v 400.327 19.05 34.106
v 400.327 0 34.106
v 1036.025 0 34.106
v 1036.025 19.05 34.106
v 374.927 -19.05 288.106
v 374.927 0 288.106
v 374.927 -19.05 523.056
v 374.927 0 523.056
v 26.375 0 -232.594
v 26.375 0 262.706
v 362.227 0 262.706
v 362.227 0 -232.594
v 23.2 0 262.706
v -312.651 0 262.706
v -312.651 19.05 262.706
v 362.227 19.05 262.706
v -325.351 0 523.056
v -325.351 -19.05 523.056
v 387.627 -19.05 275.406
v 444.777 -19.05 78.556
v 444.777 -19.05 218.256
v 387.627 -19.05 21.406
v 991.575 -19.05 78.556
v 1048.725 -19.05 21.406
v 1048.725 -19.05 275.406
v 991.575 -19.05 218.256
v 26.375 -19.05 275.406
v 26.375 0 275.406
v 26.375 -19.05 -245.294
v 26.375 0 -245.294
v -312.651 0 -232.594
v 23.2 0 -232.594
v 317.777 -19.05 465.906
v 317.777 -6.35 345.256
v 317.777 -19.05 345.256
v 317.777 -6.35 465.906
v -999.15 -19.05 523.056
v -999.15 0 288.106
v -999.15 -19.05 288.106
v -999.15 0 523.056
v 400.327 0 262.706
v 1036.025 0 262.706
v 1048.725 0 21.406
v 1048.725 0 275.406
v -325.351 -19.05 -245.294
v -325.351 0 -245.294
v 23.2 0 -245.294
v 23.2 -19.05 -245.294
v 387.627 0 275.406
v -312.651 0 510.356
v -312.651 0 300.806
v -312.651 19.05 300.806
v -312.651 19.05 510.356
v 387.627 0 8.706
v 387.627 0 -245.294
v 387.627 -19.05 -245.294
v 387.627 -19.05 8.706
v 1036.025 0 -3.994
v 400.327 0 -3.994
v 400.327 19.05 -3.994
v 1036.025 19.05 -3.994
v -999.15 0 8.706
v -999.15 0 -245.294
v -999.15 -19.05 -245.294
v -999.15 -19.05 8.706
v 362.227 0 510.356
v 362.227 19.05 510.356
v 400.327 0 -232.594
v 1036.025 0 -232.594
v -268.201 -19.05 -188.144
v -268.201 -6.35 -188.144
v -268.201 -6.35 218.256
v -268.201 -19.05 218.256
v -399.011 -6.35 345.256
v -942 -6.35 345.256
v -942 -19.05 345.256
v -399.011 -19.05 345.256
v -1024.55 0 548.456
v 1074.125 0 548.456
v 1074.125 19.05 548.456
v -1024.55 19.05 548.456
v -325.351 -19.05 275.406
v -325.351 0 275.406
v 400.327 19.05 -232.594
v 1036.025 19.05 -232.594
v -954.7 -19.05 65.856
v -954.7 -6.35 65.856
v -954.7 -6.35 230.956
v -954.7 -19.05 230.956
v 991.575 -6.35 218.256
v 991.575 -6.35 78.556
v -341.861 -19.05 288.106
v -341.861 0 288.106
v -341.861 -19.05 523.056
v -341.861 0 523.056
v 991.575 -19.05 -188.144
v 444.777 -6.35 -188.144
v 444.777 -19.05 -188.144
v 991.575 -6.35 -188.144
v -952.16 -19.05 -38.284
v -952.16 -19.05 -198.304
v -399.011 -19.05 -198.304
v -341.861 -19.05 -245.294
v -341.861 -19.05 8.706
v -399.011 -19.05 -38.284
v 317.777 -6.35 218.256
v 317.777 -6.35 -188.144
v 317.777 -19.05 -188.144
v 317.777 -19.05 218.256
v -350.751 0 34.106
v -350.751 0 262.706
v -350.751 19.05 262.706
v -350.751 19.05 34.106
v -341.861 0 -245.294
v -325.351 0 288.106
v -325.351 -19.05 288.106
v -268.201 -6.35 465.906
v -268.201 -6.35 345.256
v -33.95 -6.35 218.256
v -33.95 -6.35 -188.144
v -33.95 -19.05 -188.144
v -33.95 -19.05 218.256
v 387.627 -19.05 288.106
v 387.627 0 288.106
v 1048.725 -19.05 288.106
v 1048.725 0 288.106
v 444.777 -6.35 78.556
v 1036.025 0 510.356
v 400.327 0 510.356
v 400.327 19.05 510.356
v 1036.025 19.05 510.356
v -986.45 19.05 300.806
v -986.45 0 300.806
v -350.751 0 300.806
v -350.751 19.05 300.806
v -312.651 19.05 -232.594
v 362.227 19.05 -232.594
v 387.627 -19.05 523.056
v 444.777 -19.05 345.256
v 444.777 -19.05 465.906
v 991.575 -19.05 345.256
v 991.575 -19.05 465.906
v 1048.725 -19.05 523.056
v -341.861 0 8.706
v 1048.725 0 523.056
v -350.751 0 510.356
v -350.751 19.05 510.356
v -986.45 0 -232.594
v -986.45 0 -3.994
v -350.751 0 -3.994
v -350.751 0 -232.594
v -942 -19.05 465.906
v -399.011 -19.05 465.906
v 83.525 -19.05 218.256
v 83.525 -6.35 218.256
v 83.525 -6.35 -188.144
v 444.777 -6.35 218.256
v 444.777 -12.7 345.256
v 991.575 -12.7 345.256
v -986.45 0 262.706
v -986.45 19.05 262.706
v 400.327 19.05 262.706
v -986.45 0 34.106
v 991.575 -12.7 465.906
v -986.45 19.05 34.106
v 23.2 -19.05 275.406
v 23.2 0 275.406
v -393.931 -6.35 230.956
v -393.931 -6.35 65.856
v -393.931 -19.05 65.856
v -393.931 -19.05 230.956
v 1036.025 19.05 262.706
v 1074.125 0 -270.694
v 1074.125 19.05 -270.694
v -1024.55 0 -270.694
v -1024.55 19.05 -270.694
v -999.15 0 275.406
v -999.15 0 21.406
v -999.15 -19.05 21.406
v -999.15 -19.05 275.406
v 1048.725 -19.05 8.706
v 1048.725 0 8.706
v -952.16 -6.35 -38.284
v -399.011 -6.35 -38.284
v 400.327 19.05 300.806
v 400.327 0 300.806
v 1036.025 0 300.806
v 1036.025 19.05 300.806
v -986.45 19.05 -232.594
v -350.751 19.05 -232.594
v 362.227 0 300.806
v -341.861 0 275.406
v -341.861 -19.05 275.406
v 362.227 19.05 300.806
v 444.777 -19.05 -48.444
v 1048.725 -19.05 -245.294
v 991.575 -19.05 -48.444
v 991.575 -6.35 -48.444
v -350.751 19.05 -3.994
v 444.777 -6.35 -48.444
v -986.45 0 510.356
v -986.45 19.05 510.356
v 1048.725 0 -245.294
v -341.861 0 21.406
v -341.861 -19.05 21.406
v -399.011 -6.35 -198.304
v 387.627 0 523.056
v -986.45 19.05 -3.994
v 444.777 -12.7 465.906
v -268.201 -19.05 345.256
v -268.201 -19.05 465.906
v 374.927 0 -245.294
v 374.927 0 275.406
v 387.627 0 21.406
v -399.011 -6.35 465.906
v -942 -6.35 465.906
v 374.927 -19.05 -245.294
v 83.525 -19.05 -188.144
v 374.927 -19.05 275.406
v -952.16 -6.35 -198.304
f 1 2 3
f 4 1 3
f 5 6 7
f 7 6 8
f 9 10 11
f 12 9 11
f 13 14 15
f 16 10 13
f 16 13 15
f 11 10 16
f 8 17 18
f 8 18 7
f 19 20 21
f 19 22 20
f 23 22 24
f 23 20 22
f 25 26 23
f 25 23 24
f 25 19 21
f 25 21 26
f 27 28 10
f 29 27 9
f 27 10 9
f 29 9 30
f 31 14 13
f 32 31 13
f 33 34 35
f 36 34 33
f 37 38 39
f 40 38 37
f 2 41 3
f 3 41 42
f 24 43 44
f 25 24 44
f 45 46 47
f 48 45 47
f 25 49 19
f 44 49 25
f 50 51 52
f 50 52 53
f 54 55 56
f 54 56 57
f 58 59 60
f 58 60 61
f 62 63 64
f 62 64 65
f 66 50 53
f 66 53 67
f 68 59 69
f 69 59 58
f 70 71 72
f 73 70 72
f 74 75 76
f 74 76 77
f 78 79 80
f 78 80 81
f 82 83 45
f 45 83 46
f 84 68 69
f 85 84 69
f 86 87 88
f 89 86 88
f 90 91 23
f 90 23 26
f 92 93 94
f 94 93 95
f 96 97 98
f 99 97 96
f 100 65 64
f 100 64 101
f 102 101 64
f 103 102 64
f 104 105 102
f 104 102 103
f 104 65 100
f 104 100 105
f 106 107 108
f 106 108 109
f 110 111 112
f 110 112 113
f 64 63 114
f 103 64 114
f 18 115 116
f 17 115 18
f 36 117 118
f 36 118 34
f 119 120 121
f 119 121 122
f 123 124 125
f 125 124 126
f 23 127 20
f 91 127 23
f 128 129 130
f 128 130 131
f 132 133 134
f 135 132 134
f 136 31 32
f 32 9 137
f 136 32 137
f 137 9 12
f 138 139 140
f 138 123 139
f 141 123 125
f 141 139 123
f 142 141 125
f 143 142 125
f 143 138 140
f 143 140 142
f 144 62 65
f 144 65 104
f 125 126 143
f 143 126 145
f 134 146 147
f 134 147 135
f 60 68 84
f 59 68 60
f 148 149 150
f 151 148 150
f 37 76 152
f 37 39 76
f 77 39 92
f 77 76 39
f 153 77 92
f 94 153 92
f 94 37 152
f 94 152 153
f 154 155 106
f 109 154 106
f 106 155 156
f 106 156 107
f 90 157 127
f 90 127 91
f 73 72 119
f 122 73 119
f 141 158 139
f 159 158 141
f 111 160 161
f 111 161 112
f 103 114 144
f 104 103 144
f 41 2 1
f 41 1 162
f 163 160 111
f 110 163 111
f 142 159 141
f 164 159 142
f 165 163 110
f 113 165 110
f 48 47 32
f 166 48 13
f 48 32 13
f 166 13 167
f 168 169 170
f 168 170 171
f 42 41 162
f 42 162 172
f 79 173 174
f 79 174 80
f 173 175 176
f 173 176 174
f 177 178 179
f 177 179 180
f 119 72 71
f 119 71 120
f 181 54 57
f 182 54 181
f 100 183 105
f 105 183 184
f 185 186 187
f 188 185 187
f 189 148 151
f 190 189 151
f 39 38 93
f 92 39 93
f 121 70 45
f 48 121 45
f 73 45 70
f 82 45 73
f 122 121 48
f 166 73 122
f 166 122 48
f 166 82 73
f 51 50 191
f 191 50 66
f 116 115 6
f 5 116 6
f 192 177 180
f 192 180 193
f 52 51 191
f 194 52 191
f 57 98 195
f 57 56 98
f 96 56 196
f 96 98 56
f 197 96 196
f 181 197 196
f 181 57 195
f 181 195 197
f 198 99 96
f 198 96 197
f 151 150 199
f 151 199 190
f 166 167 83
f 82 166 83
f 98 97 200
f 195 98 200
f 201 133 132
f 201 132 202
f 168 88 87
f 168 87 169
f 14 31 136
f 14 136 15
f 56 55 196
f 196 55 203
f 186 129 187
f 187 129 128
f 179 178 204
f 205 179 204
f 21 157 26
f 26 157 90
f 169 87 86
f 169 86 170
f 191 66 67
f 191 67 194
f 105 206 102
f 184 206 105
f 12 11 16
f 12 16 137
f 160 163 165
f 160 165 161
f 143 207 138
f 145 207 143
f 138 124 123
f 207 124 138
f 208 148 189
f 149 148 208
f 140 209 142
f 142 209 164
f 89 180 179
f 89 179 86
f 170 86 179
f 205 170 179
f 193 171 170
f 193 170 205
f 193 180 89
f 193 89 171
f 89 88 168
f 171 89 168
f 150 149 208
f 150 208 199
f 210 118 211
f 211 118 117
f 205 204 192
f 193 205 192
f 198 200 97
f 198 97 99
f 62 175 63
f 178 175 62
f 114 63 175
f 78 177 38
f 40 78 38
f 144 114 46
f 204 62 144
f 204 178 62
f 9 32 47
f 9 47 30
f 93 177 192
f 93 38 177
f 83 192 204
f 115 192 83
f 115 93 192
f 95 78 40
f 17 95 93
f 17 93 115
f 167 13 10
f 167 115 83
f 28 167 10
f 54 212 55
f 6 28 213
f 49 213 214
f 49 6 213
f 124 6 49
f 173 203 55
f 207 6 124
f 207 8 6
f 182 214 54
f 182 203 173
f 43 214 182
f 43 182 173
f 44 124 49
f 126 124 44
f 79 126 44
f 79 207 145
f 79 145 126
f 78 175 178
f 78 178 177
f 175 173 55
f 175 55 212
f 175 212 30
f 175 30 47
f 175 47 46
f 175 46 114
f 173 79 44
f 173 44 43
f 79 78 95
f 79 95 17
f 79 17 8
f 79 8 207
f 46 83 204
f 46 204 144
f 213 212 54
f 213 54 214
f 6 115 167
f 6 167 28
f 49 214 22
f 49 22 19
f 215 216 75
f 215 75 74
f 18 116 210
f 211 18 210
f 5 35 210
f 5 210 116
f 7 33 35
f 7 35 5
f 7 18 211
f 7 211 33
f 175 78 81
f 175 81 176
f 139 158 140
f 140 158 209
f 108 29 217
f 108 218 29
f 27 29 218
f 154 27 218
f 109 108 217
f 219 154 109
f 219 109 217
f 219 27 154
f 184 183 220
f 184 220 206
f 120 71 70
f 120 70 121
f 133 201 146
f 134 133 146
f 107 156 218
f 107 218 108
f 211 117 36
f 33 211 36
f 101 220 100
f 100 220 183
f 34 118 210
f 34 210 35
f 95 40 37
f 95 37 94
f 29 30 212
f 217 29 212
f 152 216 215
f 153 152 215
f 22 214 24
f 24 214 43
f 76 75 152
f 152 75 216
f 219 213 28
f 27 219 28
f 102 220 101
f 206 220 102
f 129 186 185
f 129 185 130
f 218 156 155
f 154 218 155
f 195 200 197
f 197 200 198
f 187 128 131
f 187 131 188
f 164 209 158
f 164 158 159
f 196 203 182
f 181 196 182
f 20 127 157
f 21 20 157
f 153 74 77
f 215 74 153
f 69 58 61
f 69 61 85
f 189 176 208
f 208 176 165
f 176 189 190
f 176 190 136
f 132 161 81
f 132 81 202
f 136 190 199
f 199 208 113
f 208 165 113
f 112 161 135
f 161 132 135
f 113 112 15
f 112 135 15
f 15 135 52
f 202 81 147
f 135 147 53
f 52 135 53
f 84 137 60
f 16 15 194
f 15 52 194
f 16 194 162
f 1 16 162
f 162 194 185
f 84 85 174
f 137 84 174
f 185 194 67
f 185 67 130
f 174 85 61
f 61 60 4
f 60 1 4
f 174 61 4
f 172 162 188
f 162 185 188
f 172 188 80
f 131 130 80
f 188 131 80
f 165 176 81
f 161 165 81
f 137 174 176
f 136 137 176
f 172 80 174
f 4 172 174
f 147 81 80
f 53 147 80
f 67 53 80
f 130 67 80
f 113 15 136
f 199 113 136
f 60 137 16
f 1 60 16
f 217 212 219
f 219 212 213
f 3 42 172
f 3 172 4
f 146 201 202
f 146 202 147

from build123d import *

# Parameters (mm, degrees)
F0_W      = 635.6985
F0_H      = 38.1
F0_W_2    = 674.878
F1_DEPTH  = 19.05
F2_W      = 657.2885064902
F2_H      = 254
F2_W_2    = 553.1485062082
F2_H_2    = 160.0199994359
F3_DEPTH  = 19.05
F2_W_3    = 560.7685060475
F2_H_3    = 165.0999991145
F4_DEPTH  = 19.05
F2_H_4    = 234.95
F2_W_4    = 542.9885064902
F2_H_5    = 120.65
F5_DEPTH  = 19.05
F6_DEPTH  = 6.35
F2_W_5    = 700.278
F2_W_6    = 585.978
F7_DEPTH  = 19.05
F8_DEPTH  = 6.35
F9_DEPTH  = 6.35
F2_W_7    = 335.8515
F2_H_6    = 495.3
F2_W_8    = 234.2515
F2_H_7    = 406.4
F10_DEPTH = 19.05
F11_DEPTH = 6.35
F2_W_9    = 661.0985
F2_W_10   = 546.7985
F2_H_8    = 139.7
F12_DEPTH = 19.05
F13_DEPTH = 12.7
F14_DEPTH = 6.35
F15_DEPTH = 6.35
F16_DEPTH = 6.35


with BuildPart() as f1:
    # F0 (on Front) → F1 (new body)
    with BuildSketch(Plane.XZ):
        Polygon((-986.4497834325, 548.455909781), (-1024.5497834325, 548.455909781), (-1024.5497834325, -270.694090219), (-986.4497834325, -270.694090219), (-986.4497834325, -232.594090219), (-986.4497834325, -3.994090219), (-986.4497834325, 34.105909781), (-986.4497834325, 262.705909781), (-986.4497834325, 300.805909781), (-986.4497834325, 510.355909781), align=None)
        with Locations((-668.6005334325, -251.644090219)):
            Rectangle(F0_W, F0_H)
        with Locations((-668.6005334325, 15.055909781)):
            Rectangle(F0_W, F0_H)
        with Locations((-668.6005334325, 281.755909781)):
            Rectangle(F0_W, F0_H)
        with Locations((-668.6005334325, 529.405909781)):
            Rectangle(F0_W, F0_H)
        Polygon((-312.6512834325, 548.455909781), (-350.7512834325, 548.455909781), (-350.7512834325, 510.355909781), (-350.7512834325, 300.805909781), (-350.7512834325, 262.705909781), (-350.7512834325, 34.105909781), (-350.7512834325, -3.994090219), (-350.7512834325, -232.594090219), (-350.7512834325, -270.694090219), (-312.6512834325, -270.694090219), (-312.6512834325, -232.594090219), (-312.6512834325, 262.705909781), (-312.6512834325, 300.805909781), (-312.6512834325, 510.355909781), align=None)
        with Locations((24.7877165675, 529.405909781)):
            Rectangle(F0_W_2, F0_H)
        with Locations((24.7877165675, 281.755909781)):
            Rectangle(F0_W_2, F0_H)
        with Locations((24.7877165675, -251.644090219)):
            Rectangle(F0_W_2, F0_H)
        Polygon((400.3267165675, 548.455909781), (362.2267165675, 548.455909781), (362.2267165675, 510.355909781), (362.2267165675, 300.805909781), (362.2267165675, 262.705909781), (362.2267165675, -232.594090219), (362.2267165675, -270.694090219), (400.3267165675, -270.694090219), (400.3267165675, -232.594090219), (400.3267165675, -3.994090219), (400.3267165675, 34.105909781), (400.3267165675, 262.705909781), (400.3267165675, 300.805909781), (400.3267165675, 510.355909781), align=None)
        with Locations((718.1759665675, 15.055909781)):
            Rectangle(F0_W, F0_H)
        with Locations((718.1759665675, 281.755909781)):
            Rectangle(F0_W, F0_H)
        with Locations((718.1759665675, 529.405909781)):
            Rectangle(F0_W, F0_H)
        with Locations((718.1759665675, -251.644090219)):
            Rectangle(F0_W, F0_H)
        Polygon((1036.0252165675, -270.694090219), (1074.1252165675, -270.694090219), (1074.1252165675, 548.455909781), (1036.0252165675, 548.455909781), (1036.0252165675, 510.355909781), (1036.0252165675, 300.805909781), (1036.0252165675, 262.705909781), (1036.0252165675, 34.105909781), (1036.0252165675, -3.994090219), (1036.0252165675, -232.594090219), align=None)
    extrude(amount=-F1_DEPTH)

    # F2 (on face) → F3 (join)
    with BuildSketch(Plane.XZ):
        with Locations((-670.5055301874, -118.294090219)):
            Rectangle(F2_W, F2_H)
        with Locations((-675.5855300463, -118.294090219)):
            Rectangle(F2_W_2, F2_H_2, mode=Mode.SUBTRACT)
    extrude(amount=F3_DEPTH)

    # F2 (on face) → F4 (join)
    with BuildSketch(Plane.XZ):
        with Locations((-670.5055301874, 148.405909781)):
            Rectangle(F2_W, F2_H)
        with Locations((-674.315529966, 148.405909781)):
            Rectangle(F2_W_3, F2_H_3, mode=Mode.SUBTRACT)
    extrude(amount=F4_DEPTH)

    # F2 (on face) → F5 (join)
    with BuildSketch(Plane.XZ):
        with Locations((-670.5055301874, 405.580909781)):
            Rectangle(F2_W, F2_H_4)
        with Locations((-670.5055301874, 405.580909781)):
            Rectangle(F2_W_4, F2_H_5, mode=Mode.SUBTRACT)
    extrude(amount=F5_DEPTH)

    # F2 (on face) → F6 (join)
    with BuildSketch(Plane.XZ):
        with Locations((-670.5055301874, 405.580909781)):
            Rectangle(F2_W_4, F2_H_5)
    extrude(amount=F6_DEPTH)

    # F2 (on face) → F7 (join)
    with BuildSketch(Plane.XZ):
        with Locations((24.7877165675, 405.580909781)):
            Rectangle(F2_W_5, F2_H_4)
        with Locations((24.7877165675, 405.580909781)):
            Rectangle(F2_W_6, F2_H_5, mode=Mode.SUBTRACT)
    extrude(amount=F7_DEPTH)

    # F2 (on face) → F8 (join)
    with BuildSketch(Plane.XZ):
        with Locations((24.7877165675, 405.580909781)):
            Rectangle(F2_W_6, F2_H_5)
    extrude(amount=F8_DEPTH)

    # F2 (on face) → F9 (join)
    with BuildSketch(Plane.XZ):
        with Locations((-674.315529966, 148.405909781)):
            Rectangle(F2_W_3, F2_H_3)
        with Locations((-675.5855300463, -118.294090219)):
            Rectangle(F2_W_2, F2_H_2)
    extrude(amount=F9_DEPTH)

    # F2 (on face) → F10 (join)
    with BuildSketch(Plane.XZ):
        Polygon((23.2002165675, 275.405909781), (-325.3512834325, 275.405909781), (-325.3512834325, -245.294090219), (23.2002165675, -245.294090219), (23.2002165675, -232.594090219), (-312.6512834325, -232.594090219), (-312.6512834325, 262.705909781), (23.2002165675, 262.705909781), align=None)
        with Locations((-144.7255334325, 15.055909781)):
            Rectangle(F2_W_7, F2_H_6)
        with Locations((-151.0755334325, 15.055909781)):
            Rectangle(F2_W_8, F2_H_7, mode=Mode.SUBTRACT)
        Polygon((26.3752165675, 275.405909781), (26.3752165675, 262.705909781), (362.2267165675, 262.705909781), (362.2267165675, -232.594090219), (26.3752165675, -232.594090219), (26.3752165675, -245.294090219), (374.9267165675, -245.294090219), (374.9267165675, 275.405909781), align=None)
        with Locations((194.3009665675, 15.055909781)):
            Rectangle(F2_W_7, F2_H_6)
        with Locations((200.6509665675, 15.055909781)):
            Rectangle(F2_W_8, F2_H_7, mode=Mode.SUBTRACT)
    extrude(amount=F10_DEPTH)

    # F2 (on face) → F11 (join)
    with BuildSketch(Plane.XZ):
        with Locations((-151.0755334325, 15.055909781)):
            Rectangle(F2_W_8, F2_H_7)
        with Locations((200.6509665675, 15.055909781)):
            Rectangle(F2_W_8, F2_H_7)
    extrude(amount=F11_DEPTH)

    # F2 (on face) → F12 (join)
    with BuildSketch(Plane.XZ):
        with Locations((718.1759665675, 405.580909781)):
            Rectangle(F2_W_9, F2_H_4)
        with Locations((718.1759665675, 405.580909781)):
            Rectangle(F2_W_10, F2_H_5, mode=Mode.SUBTRACT)
        with Locations((718.1759665675, 148.405909781)):
            Rectangle(F2_W_9, F2_H)
        with Locations((718.1759665675, 148.405909781)):
            Rectangle(F2_W_10, F2_H_8, mode=Mode.SUBTRACT)
        with Locations((718.1759665675, -118.294090219)):
            Rectangle(F2_W_9, F2_H)
        with Locations((718.1759665675, -118.294090219)):
            Rectangle(F2_W_10, F2_H_8, mode=Mode.SUBTRACT)
    extrude(amount=F12_DEPTH)

    # F2 (on face) → F13 (join)
    with BuildSketch(Plane.XZ):
        with Locations((718.1759665675, 405.580909781)):
            Rectangle(F2_W_10, F2_H_5)
    extrude(amount=F13_DEPTH)

    # F14 (cut): a face of the model
    f14_faces = [f1.faces().sort_by_distance(p)[0] for p in [
        (718.1759665675, -12.7, 405.580909781),
    ]]
    extrude(f14_faces, amount=F14_DEPTH, mode=Mode.SUBTRACT)

    # F2 (on face) → F15 (cut)
    with BuildSketch(Plane.XZ):
        with Locations((718.1759665675, 405.580909781)):
            Rectangle(F2_W_10, F2_H_5)
    extrude(amount=-F15_DEPTH, mode=Mode.SUBTRACT)

    # F2 (on face) → F16 (join)
    with BuildSketch(Plane.XZ):
        with Locations((718.1759665675, 148.405909781)):
            Rectangle(F2_W_10, F2_H_8)
        with Locations((718.1759665675, -118.294090219)):
            Rectangle(F2_W_10, F2_H_8)
    extrude(amount=F16_DEPTH)


solid = f1.part
